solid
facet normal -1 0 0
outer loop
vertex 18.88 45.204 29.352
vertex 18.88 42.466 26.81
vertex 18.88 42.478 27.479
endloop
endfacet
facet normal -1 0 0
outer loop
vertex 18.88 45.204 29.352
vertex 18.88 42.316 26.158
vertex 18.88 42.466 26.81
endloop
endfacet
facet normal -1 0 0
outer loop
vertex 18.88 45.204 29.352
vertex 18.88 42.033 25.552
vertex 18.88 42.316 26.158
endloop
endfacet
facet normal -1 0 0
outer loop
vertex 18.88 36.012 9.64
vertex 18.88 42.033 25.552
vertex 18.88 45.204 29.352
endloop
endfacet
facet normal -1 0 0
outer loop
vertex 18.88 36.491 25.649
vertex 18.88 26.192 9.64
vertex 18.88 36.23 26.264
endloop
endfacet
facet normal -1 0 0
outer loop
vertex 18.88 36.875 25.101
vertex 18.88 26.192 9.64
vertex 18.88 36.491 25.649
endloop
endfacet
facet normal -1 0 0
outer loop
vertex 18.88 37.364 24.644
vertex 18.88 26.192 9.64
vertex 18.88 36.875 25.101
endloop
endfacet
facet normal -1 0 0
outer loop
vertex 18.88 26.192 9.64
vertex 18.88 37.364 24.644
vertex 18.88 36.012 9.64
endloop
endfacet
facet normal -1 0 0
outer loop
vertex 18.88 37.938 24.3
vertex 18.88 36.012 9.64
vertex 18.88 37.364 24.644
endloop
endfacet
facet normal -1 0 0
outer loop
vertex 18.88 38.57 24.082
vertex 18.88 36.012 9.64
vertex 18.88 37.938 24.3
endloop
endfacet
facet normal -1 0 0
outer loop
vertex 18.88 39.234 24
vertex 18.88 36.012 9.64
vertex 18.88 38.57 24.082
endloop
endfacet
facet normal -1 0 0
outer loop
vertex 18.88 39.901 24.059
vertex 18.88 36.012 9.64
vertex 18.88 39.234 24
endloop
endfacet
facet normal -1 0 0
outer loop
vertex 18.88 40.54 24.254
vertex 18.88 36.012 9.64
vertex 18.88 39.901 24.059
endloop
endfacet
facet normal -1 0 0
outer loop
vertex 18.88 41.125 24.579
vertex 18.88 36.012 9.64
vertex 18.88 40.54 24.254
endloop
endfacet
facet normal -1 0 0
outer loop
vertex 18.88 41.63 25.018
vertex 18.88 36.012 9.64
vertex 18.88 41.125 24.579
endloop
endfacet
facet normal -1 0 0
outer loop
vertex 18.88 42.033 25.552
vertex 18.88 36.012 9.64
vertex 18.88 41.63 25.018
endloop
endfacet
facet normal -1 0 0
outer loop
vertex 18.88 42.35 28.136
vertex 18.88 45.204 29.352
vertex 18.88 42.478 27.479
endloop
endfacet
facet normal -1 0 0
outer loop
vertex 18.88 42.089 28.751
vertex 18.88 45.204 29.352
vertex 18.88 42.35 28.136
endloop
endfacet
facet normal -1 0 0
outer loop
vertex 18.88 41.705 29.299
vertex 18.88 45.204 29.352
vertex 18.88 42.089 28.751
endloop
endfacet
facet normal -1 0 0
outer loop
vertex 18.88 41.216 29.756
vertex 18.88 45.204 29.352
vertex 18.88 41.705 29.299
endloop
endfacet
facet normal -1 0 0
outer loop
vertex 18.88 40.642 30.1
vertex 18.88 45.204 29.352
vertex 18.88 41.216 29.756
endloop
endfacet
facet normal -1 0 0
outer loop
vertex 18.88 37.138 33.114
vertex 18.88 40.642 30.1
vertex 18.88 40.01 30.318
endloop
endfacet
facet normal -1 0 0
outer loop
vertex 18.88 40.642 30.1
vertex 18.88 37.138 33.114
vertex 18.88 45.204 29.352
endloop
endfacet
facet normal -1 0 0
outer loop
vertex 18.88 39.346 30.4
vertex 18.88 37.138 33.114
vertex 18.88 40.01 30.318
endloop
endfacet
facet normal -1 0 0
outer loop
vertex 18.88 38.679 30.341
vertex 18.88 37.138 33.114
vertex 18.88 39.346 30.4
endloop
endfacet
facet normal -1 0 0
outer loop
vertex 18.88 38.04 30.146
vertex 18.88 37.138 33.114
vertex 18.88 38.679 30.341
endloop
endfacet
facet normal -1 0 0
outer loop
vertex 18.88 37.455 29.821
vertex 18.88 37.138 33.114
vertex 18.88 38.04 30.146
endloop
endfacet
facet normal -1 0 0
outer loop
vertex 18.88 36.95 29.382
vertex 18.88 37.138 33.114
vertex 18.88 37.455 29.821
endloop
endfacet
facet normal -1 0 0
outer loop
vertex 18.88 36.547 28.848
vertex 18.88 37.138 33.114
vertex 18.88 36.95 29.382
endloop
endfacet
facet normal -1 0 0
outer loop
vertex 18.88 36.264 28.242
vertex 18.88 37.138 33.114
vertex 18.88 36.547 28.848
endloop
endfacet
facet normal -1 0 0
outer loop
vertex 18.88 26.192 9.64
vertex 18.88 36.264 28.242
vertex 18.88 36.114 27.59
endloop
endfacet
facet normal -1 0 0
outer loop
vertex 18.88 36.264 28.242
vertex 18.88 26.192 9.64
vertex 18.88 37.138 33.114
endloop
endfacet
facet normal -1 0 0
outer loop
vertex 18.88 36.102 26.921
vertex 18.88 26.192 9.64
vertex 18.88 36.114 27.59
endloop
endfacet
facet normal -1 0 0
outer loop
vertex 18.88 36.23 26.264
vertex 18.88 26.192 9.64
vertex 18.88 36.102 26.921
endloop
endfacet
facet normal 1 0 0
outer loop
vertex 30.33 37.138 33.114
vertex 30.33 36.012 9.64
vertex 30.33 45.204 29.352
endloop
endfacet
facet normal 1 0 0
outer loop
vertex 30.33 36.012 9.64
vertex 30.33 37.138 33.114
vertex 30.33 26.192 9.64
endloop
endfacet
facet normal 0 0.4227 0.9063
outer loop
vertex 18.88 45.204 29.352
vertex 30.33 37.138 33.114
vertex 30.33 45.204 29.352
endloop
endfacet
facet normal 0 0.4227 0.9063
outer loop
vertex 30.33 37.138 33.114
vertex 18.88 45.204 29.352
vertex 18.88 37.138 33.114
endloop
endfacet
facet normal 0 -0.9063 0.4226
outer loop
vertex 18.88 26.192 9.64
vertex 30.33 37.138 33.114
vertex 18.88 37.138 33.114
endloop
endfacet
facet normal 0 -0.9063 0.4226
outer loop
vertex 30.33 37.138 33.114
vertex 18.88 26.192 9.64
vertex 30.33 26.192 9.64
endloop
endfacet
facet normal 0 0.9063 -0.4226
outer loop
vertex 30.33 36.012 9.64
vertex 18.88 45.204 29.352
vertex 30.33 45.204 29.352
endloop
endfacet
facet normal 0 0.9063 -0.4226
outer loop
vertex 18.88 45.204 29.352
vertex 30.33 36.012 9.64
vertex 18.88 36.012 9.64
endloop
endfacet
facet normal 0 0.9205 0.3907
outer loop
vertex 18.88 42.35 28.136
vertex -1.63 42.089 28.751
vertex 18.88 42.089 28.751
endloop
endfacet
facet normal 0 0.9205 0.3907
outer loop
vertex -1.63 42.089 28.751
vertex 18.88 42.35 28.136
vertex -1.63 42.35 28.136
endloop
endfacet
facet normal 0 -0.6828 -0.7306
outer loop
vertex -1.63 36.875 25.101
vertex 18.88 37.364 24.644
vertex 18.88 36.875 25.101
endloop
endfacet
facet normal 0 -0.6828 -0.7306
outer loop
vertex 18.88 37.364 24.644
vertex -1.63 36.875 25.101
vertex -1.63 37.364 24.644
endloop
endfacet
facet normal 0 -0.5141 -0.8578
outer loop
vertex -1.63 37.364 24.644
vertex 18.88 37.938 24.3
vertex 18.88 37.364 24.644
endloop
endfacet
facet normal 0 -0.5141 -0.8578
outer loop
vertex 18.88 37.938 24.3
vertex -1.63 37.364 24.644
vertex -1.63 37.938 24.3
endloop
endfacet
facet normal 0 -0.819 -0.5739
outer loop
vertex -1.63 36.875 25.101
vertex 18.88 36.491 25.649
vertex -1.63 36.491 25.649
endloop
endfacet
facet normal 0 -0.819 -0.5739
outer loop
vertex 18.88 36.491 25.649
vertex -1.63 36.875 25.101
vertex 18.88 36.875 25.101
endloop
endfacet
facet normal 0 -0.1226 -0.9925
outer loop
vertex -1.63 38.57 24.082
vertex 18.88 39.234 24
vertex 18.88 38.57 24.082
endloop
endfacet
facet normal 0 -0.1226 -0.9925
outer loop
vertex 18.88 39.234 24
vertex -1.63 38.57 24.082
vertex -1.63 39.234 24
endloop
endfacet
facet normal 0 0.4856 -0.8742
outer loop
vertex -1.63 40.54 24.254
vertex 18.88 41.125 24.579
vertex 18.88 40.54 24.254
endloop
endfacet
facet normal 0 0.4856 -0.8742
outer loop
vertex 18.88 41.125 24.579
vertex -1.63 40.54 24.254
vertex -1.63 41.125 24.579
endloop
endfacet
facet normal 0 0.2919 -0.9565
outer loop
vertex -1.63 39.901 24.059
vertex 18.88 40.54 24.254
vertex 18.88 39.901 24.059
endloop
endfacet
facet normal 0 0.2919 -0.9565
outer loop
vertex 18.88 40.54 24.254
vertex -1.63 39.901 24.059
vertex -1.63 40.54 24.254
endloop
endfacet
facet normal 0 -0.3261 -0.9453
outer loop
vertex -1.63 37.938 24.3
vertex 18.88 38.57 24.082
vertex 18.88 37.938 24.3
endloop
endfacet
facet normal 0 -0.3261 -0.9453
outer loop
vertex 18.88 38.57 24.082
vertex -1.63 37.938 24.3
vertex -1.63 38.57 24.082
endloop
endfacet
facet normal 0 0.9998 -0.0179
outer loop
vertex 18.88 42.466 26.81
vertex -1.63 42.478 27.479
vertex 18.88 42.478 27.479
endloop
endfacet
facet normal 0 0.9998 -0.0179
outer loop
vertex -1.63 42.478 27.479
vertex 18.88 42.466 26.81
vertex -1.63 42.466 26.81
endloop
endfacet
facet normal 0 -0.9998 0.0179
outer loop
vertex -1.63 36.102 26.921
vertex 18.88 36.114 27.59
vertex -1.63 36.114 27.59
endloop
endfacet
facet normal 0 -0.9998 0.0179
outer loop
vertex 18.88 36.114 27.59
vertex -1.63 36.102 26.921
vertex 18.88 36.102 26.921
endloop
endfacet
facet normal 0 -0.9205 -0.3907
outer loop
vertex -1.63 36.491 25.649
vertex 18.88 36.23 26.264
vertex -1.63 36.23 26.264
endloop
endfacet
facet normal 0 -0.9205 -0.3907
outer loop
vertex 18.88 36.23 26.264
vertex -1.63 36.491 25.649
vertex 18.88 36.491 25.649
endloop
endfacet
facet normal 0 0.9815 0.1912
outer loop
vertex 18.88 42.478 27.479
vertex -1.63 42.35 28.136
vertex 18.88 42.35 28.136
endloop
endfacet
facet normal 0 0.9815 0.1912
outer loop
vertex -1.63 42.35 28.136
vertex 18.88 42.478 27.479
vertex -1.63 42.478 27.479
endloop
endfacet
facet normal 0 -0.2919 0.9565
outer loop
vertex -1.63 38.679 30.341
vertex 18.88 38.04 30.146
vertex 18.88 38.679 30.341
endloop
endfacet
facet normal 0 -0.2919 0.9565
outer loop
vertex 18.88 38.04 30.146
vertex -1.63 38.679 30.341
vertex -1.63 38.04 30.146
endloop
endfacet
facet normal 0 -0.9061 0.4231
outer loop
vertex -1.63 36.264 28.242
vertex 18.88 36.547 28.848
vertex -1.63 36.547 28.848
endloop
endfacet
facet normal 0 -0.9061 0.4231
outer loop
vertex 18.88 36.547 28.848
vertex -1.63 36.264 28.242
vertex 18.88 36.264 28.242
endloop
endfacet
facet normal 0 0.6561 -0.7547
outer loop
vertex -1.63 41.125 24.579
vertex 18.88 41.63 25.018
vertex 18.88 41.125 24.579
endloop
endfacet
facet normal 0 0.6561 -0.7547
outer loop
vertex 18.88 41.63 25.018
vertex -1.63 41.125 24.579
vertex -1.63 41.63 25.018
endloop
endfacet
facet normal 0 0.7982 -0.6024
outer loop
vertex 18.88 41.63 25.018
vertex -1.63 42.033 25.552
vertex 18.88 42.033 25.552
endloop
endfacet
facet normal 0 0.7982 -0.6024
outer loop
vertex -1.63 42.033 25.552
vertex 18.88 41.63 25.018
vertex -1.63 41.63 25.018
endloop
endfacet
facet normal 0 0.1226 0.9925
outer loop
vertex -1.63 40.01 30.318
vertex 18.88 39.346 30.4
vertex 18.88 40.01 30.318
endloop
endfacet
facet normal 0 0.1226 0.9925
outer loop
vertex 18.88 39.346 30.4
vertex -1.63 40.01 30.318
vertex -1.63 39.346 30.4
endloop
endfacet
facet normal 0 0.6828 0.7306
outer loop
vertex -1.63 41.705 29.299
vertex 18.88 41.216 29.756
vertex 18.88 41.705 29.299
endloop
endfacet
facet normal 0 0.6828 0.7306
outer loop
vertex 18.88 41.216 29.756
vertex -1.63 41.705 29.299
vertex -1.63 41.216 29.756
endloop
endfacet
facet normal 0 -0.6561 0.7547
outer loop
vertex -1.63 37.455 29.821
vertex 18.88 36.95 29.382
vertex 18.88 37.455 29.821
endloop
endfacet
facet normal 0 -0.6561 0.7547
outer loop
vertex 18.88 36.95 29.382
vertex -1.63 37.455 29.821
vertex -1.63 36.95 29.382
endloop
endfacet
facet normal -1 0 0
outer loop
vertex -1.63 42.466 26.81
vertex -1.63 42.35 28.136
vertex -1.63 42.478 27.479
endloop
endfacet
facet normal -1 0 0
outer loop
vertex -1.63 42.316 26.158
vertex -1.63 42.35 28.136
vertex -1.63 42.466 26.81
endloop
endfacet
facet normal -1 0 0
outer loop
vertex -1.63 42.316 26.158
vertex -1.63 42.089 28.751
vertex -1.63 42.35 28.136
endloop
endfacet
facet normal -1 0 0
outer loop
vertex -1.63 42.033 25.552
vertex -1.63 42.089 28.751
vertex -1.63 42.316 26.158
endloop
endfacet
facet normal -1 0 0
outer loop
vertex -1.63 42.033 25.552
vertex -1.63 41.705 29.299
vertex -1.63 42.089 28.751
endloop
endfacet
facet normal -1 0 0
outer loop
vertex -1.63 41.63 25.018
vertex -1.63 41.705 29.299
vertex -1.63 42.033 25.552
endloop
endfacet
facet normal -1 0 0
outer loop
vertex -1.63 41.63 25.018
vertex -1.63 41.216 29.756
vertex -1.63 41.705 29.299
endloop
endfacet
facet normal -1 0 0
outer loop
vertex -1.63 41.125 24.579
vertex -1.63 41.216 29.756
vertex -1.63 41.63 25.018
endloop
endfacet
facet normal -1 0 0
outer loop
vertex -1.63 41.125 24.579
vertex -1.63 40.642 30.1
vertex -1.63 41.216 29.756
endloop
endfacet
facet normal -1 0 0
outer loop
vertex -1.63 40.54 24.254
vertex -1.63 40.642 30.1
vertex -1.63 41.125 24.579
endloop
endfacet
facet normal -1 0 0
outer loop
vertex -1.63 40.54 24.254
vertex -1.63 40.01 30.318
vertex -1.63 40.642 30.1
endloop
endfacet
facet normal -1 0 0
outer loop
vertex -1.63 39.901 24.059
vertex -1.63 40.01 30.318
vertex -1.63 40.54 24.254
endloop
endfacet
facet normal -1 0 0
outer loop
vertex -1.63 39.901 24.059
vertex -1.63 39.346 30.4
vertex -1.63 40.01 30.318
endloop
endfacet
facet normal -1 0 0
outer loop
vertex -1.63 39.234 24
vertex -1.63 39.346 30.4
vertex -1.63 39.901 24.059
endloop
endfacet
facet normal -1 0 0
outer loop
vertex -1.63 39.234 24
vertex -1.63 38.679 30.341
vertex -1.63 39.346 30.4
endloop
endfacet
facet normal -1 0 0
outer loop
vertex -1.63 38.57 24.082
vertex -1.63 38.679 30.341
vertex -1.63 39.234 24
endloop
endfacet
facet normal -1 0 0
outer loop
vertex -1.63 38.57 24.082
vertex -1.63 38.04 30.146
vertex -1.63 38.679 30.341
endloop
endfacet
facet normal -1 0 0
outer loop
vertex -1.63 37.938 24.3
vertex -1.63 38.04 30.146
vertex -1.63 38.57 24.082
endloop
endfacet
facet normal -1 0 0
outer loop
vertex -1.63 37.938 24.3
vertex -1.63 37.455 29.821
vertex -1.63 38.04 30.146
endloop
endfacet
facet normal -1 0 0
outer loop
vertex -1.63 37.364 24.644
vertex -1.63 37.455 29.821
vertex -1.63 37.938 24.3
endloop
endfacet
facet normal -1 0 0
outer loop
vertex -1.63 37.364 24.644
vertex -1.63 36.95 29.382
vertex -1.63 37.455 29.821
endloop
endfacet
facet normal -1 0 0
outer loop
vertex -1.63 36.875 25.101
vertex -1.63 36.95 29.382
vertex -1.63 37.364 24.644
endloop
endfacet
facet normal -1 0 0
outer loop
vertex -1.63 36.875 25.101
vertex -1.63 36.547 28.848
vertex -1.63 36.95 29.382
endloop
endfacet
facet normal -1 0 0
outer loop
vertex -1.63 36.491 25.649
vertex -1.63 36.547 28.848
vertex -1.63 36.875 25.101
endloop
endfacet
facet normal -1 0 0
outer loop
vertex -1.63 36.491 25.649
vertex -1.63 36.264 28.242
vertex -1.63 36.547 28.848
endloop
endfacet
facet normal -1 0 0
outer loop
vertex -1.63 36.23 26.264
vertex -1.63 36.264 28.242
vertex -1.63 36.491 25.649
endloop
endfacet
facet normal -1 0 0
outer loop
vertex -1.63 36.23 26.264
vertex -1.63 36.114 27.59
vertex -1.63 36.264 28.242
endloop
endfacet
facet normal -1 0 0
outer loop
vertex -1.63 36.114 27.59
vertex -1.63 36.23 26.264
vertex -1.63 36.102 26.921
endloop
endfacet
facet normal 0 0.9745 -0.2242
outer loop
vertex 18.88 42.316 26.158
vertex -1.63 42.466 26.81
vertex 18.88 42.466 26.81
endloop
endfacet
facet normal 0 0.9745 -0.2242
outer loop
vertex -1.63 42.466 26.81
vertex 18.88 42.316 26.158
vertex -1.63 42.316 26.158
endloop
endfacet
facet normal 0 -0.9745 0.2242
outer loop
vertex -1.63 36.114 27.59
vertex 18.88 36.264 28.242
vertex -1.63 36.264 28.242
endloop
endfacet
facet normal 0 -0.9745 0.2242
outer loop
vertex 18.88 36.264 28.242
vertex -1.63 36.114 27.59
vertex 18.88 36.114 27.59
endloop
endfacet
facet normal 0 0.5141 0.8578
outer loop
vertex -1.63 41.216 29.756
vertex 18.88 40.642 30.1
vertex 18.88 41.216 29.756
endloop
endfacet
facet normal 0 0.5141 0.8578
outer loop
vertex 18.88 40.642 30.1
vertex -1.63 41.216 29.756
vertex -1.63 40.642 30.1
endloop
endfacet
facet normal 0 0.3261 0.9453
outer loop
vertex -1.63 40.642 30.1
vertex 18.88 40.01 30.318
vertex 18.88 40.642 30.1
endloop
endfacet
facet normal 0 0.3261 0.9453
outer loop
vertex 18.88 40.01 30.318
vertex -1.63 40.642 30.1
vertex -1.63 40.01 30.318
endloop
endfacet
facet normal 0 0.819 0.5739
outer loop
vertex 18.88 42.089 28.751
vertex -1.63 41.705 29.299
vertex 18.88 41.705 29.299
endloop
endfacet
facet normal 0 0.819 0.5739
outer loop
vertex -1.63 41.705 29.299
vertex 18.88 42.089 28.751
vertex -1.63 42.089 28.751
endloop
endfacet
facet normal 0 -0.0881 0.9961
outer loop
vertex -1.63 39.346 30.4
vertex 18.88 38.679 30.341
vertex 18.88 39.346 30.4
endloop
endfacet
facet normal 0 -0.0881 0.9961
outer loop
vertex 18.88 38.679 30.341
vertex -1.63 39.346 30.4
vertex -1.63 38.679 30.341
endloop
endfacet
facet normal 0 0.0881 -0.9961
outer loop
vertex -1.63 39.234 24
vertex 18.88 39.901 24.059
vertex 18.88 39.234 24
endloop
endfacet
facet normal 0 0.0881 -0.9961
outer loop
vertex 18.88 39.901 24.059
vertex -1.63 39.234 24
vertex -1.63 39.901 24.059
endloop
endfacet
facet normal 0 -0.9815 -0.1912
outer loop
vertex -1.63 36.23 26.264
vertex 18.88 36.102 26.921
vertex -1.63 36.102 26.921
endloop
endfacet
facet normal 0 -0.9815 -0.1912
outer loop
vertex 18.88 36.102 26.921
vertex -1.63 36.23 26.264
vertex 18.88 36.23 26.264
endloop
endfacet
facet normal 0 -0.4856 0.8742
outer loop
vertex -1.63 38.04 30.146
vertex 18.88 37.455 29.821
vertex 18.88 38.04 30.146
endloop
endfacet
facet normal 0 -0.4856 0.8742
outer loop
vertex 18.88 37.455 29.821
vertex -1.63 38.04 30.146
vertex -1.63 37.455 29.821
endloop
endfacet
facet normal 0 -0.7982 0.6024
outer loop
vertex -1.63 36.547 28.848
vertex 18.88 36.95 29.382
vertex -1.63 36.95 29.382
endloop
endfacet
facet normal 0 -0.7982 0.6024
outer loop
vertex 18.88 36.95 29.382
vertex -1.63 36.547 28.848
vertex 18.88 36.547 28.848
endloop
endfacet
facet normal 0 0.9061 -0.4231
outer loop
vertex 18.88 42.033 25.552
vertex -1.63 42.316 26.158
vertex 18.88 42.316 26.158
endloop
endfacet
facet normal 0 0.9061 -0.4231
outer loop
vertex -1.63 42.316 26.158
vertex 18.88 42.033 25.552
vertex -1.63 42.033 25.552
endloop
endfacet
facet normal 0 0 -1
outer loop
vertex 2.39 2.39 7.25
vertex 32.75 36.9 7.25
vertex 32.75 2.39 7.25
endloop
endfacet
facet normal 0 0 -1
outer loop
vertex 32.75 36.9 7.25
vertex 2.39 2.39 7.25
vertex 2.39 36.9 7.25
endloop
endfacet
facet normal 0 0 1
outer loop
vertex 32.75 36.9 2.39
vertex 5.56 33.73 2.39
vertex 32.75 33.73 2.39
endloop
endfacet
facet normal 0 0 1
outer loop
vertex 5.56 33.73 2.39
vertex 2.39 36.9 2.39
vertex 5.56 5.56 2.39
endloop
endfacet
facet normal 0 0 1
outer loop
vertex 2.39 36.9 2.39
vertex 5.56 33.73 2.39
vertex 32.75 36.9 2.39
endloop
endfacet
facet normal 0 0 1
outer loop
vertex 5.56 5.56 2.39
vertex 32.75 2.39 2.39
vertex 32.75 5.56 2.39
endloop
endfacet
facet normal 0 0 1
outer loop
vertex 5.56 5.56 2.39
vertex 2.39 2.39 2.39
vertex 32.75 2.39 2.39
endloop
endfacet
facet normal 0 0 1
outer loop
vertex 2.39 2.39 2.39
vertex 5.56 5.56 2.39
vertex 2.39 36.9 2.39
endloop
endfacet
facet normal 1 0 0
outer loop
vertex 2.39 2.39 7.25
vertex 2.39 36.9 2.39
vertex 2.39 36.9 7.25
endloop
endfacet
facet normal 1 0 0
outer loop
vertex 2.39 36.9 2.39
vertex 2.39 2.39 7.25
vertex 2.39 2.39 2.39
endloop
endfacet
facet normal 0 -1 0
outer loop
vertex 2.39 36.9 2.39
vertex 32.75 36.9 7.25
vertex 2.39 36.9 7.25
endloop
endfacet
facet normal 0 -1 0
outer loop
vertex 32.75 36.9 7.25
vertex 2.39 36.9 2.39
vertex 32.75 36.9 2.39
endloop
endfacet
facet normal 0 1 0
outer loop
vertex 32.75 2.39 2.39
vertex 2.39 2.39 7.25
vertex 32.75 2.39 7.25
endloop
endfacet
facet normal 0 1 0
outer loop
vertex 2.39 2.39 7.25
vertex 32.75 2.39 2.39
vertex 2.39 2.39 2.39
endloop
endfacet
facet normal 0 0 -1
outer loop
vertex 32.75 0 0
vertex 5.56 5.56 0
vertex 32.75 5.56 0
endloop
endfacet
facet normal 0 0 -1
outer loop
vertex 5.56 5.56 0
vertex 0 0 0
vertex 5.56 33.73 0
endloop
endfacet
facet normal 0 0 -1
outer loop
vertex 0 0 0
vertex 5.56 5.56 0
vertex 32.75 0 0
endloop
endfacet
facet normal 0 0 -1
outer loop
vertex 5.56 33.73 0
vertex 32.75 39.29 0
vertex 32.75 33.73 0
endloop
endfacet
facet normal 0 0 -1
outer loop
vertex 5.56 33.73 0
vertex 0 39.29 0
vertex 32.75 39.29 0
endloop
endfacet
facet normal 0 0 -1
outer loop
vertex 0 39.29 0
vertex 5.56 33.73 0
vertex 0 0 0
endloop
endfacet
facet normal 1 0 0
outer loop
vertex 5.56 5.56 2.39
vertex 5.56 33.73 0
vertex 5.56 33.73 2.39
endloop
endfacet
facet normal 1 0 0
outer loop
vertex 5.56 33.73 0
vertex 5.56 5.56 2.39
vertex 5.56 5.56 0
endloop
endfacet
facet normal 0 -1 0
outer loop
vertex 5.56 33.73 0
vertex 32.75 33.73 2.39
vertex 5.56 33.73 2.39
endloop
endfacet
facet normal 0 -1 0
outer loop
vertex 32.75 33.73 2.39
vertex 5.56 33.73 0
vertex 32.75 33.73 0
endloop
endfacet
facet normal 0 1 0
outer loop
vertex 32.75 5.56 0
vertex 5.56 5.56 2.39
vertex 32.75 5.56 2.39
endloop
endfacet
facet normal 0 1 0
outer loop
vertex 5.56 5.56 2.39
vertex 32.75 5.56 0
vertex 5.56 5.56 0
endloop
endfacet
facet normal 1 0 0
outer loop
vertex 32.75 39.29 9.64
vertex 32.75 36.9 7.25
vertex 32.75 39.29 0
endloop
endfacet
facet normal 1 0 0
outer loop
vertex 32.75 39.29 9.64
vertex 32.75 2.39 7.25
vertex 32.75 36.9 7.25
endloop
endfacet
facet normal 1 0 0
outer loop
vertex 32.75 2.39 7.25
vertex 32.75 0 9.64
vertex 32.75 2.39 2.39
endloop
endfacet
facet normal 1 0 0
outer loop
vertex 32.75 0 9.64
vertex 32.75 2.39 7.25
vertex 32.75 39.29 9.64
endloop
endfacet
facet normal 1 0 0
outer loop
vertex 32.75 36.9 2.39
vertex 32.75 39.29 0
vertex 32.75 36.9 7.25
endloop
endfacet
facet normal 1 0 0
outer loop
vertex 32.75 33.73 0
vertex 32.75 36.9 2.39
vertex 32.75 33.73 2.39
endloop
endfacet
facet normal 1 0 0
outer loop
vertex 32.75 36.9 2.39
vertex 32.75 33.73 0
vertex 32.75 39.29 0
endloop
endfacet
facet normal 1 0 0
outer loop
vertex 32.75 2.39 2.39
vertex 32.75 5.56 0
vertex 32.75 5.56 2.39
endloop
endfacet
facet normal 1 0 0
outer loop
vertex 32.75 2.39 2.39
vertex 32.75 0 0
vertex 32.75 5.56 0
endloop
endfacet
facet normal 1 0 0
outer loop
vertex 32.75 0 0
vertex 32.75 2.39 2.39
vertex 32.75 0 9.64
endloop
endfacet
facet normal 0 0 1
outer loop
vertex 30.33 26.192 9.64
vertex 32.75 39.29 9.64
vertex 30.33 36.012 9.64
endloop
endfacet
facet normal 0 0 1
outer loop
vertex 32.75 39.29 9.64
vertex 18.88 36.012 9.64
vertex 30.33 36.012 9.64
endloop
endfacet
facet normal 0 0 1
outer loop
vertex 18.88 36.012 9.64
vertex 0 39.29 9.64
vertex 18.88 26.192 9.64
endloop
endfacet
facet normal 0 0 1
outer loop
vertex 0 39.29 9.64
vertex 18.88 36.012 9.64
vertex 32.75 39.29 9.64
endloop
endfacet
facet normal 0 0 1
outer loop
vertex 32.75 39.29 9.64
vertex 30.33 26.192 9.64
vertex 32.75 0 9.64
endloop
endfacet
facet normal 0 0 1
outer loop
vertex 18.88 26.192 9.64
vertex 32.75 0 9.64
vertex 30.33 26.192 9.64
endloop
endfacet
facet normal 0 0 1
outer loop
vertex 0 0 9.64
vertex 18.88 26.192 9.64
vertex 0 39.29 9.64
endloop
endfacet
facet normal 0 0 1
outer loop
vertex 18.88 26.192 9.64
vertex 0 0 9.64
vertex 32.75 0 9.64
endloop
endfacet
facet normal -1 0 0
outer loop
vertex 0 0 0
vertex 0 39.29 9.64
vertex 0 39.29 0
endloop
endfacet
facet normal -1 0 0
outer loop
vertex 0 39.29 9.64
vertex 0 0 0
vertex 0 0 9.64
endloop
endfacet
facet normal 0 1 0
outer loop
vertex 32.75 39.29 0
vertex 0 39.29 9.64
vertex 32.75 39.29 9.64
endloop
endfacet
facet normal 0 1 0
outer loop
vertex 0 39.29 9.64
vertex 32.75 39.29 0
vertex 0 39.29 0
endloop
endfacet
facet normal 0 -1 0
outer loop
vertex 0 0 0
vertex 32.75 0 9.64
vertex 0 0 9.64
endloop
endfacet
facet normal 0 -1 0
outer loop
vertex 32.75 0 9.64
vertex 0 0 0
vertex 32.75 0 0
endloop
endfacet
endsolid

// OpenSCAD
$fn=30;
c_ep=2.39;
c_lo=39.29;
c_la=32.75;
c_h=9.64;
c_lang=5.56;
cy_r=3.20;
cy_h=20.51;
b_lo=26;
b_la=8.90;
b_h=11.45;
h_diag=20.76;

module bas()
{
	difference()
	{
		cube([c_la,c_lo,c_h]);
		union()
		{
			translate([c_ep,c_ep,c_ep]) cube([c_la-1*c_ep+1,c_lo-2*c_ep,c_h-2*c_ep]);
			translate([c_lang,c_lang,0]) cube([c_la-c_lang+1,c_lo-2*c_lang,c_ep+1]);
		}
	}
}

module haut()
{
	translate ([b_lo/2-1.25-cy_r,0,b_h/2])cube([b_lo,b_la,b_h],center=true);
	translate([0,0,b_h-1]) cylinder(h=cy_h+1,r=cy_r,center=false);
}

difference()
{
union()
{
translate([c_la-2.42,c_lo,b_lo+1.2]) rotate([115-90,0,180]) rotate([0,90,0]) haut();
bas();
}
translate([c_ep,c_ep,c_ep]) cube([c_la-1*c_ep+1,c_lo-2*c_ep,c_h-2*c_ep]);
}
